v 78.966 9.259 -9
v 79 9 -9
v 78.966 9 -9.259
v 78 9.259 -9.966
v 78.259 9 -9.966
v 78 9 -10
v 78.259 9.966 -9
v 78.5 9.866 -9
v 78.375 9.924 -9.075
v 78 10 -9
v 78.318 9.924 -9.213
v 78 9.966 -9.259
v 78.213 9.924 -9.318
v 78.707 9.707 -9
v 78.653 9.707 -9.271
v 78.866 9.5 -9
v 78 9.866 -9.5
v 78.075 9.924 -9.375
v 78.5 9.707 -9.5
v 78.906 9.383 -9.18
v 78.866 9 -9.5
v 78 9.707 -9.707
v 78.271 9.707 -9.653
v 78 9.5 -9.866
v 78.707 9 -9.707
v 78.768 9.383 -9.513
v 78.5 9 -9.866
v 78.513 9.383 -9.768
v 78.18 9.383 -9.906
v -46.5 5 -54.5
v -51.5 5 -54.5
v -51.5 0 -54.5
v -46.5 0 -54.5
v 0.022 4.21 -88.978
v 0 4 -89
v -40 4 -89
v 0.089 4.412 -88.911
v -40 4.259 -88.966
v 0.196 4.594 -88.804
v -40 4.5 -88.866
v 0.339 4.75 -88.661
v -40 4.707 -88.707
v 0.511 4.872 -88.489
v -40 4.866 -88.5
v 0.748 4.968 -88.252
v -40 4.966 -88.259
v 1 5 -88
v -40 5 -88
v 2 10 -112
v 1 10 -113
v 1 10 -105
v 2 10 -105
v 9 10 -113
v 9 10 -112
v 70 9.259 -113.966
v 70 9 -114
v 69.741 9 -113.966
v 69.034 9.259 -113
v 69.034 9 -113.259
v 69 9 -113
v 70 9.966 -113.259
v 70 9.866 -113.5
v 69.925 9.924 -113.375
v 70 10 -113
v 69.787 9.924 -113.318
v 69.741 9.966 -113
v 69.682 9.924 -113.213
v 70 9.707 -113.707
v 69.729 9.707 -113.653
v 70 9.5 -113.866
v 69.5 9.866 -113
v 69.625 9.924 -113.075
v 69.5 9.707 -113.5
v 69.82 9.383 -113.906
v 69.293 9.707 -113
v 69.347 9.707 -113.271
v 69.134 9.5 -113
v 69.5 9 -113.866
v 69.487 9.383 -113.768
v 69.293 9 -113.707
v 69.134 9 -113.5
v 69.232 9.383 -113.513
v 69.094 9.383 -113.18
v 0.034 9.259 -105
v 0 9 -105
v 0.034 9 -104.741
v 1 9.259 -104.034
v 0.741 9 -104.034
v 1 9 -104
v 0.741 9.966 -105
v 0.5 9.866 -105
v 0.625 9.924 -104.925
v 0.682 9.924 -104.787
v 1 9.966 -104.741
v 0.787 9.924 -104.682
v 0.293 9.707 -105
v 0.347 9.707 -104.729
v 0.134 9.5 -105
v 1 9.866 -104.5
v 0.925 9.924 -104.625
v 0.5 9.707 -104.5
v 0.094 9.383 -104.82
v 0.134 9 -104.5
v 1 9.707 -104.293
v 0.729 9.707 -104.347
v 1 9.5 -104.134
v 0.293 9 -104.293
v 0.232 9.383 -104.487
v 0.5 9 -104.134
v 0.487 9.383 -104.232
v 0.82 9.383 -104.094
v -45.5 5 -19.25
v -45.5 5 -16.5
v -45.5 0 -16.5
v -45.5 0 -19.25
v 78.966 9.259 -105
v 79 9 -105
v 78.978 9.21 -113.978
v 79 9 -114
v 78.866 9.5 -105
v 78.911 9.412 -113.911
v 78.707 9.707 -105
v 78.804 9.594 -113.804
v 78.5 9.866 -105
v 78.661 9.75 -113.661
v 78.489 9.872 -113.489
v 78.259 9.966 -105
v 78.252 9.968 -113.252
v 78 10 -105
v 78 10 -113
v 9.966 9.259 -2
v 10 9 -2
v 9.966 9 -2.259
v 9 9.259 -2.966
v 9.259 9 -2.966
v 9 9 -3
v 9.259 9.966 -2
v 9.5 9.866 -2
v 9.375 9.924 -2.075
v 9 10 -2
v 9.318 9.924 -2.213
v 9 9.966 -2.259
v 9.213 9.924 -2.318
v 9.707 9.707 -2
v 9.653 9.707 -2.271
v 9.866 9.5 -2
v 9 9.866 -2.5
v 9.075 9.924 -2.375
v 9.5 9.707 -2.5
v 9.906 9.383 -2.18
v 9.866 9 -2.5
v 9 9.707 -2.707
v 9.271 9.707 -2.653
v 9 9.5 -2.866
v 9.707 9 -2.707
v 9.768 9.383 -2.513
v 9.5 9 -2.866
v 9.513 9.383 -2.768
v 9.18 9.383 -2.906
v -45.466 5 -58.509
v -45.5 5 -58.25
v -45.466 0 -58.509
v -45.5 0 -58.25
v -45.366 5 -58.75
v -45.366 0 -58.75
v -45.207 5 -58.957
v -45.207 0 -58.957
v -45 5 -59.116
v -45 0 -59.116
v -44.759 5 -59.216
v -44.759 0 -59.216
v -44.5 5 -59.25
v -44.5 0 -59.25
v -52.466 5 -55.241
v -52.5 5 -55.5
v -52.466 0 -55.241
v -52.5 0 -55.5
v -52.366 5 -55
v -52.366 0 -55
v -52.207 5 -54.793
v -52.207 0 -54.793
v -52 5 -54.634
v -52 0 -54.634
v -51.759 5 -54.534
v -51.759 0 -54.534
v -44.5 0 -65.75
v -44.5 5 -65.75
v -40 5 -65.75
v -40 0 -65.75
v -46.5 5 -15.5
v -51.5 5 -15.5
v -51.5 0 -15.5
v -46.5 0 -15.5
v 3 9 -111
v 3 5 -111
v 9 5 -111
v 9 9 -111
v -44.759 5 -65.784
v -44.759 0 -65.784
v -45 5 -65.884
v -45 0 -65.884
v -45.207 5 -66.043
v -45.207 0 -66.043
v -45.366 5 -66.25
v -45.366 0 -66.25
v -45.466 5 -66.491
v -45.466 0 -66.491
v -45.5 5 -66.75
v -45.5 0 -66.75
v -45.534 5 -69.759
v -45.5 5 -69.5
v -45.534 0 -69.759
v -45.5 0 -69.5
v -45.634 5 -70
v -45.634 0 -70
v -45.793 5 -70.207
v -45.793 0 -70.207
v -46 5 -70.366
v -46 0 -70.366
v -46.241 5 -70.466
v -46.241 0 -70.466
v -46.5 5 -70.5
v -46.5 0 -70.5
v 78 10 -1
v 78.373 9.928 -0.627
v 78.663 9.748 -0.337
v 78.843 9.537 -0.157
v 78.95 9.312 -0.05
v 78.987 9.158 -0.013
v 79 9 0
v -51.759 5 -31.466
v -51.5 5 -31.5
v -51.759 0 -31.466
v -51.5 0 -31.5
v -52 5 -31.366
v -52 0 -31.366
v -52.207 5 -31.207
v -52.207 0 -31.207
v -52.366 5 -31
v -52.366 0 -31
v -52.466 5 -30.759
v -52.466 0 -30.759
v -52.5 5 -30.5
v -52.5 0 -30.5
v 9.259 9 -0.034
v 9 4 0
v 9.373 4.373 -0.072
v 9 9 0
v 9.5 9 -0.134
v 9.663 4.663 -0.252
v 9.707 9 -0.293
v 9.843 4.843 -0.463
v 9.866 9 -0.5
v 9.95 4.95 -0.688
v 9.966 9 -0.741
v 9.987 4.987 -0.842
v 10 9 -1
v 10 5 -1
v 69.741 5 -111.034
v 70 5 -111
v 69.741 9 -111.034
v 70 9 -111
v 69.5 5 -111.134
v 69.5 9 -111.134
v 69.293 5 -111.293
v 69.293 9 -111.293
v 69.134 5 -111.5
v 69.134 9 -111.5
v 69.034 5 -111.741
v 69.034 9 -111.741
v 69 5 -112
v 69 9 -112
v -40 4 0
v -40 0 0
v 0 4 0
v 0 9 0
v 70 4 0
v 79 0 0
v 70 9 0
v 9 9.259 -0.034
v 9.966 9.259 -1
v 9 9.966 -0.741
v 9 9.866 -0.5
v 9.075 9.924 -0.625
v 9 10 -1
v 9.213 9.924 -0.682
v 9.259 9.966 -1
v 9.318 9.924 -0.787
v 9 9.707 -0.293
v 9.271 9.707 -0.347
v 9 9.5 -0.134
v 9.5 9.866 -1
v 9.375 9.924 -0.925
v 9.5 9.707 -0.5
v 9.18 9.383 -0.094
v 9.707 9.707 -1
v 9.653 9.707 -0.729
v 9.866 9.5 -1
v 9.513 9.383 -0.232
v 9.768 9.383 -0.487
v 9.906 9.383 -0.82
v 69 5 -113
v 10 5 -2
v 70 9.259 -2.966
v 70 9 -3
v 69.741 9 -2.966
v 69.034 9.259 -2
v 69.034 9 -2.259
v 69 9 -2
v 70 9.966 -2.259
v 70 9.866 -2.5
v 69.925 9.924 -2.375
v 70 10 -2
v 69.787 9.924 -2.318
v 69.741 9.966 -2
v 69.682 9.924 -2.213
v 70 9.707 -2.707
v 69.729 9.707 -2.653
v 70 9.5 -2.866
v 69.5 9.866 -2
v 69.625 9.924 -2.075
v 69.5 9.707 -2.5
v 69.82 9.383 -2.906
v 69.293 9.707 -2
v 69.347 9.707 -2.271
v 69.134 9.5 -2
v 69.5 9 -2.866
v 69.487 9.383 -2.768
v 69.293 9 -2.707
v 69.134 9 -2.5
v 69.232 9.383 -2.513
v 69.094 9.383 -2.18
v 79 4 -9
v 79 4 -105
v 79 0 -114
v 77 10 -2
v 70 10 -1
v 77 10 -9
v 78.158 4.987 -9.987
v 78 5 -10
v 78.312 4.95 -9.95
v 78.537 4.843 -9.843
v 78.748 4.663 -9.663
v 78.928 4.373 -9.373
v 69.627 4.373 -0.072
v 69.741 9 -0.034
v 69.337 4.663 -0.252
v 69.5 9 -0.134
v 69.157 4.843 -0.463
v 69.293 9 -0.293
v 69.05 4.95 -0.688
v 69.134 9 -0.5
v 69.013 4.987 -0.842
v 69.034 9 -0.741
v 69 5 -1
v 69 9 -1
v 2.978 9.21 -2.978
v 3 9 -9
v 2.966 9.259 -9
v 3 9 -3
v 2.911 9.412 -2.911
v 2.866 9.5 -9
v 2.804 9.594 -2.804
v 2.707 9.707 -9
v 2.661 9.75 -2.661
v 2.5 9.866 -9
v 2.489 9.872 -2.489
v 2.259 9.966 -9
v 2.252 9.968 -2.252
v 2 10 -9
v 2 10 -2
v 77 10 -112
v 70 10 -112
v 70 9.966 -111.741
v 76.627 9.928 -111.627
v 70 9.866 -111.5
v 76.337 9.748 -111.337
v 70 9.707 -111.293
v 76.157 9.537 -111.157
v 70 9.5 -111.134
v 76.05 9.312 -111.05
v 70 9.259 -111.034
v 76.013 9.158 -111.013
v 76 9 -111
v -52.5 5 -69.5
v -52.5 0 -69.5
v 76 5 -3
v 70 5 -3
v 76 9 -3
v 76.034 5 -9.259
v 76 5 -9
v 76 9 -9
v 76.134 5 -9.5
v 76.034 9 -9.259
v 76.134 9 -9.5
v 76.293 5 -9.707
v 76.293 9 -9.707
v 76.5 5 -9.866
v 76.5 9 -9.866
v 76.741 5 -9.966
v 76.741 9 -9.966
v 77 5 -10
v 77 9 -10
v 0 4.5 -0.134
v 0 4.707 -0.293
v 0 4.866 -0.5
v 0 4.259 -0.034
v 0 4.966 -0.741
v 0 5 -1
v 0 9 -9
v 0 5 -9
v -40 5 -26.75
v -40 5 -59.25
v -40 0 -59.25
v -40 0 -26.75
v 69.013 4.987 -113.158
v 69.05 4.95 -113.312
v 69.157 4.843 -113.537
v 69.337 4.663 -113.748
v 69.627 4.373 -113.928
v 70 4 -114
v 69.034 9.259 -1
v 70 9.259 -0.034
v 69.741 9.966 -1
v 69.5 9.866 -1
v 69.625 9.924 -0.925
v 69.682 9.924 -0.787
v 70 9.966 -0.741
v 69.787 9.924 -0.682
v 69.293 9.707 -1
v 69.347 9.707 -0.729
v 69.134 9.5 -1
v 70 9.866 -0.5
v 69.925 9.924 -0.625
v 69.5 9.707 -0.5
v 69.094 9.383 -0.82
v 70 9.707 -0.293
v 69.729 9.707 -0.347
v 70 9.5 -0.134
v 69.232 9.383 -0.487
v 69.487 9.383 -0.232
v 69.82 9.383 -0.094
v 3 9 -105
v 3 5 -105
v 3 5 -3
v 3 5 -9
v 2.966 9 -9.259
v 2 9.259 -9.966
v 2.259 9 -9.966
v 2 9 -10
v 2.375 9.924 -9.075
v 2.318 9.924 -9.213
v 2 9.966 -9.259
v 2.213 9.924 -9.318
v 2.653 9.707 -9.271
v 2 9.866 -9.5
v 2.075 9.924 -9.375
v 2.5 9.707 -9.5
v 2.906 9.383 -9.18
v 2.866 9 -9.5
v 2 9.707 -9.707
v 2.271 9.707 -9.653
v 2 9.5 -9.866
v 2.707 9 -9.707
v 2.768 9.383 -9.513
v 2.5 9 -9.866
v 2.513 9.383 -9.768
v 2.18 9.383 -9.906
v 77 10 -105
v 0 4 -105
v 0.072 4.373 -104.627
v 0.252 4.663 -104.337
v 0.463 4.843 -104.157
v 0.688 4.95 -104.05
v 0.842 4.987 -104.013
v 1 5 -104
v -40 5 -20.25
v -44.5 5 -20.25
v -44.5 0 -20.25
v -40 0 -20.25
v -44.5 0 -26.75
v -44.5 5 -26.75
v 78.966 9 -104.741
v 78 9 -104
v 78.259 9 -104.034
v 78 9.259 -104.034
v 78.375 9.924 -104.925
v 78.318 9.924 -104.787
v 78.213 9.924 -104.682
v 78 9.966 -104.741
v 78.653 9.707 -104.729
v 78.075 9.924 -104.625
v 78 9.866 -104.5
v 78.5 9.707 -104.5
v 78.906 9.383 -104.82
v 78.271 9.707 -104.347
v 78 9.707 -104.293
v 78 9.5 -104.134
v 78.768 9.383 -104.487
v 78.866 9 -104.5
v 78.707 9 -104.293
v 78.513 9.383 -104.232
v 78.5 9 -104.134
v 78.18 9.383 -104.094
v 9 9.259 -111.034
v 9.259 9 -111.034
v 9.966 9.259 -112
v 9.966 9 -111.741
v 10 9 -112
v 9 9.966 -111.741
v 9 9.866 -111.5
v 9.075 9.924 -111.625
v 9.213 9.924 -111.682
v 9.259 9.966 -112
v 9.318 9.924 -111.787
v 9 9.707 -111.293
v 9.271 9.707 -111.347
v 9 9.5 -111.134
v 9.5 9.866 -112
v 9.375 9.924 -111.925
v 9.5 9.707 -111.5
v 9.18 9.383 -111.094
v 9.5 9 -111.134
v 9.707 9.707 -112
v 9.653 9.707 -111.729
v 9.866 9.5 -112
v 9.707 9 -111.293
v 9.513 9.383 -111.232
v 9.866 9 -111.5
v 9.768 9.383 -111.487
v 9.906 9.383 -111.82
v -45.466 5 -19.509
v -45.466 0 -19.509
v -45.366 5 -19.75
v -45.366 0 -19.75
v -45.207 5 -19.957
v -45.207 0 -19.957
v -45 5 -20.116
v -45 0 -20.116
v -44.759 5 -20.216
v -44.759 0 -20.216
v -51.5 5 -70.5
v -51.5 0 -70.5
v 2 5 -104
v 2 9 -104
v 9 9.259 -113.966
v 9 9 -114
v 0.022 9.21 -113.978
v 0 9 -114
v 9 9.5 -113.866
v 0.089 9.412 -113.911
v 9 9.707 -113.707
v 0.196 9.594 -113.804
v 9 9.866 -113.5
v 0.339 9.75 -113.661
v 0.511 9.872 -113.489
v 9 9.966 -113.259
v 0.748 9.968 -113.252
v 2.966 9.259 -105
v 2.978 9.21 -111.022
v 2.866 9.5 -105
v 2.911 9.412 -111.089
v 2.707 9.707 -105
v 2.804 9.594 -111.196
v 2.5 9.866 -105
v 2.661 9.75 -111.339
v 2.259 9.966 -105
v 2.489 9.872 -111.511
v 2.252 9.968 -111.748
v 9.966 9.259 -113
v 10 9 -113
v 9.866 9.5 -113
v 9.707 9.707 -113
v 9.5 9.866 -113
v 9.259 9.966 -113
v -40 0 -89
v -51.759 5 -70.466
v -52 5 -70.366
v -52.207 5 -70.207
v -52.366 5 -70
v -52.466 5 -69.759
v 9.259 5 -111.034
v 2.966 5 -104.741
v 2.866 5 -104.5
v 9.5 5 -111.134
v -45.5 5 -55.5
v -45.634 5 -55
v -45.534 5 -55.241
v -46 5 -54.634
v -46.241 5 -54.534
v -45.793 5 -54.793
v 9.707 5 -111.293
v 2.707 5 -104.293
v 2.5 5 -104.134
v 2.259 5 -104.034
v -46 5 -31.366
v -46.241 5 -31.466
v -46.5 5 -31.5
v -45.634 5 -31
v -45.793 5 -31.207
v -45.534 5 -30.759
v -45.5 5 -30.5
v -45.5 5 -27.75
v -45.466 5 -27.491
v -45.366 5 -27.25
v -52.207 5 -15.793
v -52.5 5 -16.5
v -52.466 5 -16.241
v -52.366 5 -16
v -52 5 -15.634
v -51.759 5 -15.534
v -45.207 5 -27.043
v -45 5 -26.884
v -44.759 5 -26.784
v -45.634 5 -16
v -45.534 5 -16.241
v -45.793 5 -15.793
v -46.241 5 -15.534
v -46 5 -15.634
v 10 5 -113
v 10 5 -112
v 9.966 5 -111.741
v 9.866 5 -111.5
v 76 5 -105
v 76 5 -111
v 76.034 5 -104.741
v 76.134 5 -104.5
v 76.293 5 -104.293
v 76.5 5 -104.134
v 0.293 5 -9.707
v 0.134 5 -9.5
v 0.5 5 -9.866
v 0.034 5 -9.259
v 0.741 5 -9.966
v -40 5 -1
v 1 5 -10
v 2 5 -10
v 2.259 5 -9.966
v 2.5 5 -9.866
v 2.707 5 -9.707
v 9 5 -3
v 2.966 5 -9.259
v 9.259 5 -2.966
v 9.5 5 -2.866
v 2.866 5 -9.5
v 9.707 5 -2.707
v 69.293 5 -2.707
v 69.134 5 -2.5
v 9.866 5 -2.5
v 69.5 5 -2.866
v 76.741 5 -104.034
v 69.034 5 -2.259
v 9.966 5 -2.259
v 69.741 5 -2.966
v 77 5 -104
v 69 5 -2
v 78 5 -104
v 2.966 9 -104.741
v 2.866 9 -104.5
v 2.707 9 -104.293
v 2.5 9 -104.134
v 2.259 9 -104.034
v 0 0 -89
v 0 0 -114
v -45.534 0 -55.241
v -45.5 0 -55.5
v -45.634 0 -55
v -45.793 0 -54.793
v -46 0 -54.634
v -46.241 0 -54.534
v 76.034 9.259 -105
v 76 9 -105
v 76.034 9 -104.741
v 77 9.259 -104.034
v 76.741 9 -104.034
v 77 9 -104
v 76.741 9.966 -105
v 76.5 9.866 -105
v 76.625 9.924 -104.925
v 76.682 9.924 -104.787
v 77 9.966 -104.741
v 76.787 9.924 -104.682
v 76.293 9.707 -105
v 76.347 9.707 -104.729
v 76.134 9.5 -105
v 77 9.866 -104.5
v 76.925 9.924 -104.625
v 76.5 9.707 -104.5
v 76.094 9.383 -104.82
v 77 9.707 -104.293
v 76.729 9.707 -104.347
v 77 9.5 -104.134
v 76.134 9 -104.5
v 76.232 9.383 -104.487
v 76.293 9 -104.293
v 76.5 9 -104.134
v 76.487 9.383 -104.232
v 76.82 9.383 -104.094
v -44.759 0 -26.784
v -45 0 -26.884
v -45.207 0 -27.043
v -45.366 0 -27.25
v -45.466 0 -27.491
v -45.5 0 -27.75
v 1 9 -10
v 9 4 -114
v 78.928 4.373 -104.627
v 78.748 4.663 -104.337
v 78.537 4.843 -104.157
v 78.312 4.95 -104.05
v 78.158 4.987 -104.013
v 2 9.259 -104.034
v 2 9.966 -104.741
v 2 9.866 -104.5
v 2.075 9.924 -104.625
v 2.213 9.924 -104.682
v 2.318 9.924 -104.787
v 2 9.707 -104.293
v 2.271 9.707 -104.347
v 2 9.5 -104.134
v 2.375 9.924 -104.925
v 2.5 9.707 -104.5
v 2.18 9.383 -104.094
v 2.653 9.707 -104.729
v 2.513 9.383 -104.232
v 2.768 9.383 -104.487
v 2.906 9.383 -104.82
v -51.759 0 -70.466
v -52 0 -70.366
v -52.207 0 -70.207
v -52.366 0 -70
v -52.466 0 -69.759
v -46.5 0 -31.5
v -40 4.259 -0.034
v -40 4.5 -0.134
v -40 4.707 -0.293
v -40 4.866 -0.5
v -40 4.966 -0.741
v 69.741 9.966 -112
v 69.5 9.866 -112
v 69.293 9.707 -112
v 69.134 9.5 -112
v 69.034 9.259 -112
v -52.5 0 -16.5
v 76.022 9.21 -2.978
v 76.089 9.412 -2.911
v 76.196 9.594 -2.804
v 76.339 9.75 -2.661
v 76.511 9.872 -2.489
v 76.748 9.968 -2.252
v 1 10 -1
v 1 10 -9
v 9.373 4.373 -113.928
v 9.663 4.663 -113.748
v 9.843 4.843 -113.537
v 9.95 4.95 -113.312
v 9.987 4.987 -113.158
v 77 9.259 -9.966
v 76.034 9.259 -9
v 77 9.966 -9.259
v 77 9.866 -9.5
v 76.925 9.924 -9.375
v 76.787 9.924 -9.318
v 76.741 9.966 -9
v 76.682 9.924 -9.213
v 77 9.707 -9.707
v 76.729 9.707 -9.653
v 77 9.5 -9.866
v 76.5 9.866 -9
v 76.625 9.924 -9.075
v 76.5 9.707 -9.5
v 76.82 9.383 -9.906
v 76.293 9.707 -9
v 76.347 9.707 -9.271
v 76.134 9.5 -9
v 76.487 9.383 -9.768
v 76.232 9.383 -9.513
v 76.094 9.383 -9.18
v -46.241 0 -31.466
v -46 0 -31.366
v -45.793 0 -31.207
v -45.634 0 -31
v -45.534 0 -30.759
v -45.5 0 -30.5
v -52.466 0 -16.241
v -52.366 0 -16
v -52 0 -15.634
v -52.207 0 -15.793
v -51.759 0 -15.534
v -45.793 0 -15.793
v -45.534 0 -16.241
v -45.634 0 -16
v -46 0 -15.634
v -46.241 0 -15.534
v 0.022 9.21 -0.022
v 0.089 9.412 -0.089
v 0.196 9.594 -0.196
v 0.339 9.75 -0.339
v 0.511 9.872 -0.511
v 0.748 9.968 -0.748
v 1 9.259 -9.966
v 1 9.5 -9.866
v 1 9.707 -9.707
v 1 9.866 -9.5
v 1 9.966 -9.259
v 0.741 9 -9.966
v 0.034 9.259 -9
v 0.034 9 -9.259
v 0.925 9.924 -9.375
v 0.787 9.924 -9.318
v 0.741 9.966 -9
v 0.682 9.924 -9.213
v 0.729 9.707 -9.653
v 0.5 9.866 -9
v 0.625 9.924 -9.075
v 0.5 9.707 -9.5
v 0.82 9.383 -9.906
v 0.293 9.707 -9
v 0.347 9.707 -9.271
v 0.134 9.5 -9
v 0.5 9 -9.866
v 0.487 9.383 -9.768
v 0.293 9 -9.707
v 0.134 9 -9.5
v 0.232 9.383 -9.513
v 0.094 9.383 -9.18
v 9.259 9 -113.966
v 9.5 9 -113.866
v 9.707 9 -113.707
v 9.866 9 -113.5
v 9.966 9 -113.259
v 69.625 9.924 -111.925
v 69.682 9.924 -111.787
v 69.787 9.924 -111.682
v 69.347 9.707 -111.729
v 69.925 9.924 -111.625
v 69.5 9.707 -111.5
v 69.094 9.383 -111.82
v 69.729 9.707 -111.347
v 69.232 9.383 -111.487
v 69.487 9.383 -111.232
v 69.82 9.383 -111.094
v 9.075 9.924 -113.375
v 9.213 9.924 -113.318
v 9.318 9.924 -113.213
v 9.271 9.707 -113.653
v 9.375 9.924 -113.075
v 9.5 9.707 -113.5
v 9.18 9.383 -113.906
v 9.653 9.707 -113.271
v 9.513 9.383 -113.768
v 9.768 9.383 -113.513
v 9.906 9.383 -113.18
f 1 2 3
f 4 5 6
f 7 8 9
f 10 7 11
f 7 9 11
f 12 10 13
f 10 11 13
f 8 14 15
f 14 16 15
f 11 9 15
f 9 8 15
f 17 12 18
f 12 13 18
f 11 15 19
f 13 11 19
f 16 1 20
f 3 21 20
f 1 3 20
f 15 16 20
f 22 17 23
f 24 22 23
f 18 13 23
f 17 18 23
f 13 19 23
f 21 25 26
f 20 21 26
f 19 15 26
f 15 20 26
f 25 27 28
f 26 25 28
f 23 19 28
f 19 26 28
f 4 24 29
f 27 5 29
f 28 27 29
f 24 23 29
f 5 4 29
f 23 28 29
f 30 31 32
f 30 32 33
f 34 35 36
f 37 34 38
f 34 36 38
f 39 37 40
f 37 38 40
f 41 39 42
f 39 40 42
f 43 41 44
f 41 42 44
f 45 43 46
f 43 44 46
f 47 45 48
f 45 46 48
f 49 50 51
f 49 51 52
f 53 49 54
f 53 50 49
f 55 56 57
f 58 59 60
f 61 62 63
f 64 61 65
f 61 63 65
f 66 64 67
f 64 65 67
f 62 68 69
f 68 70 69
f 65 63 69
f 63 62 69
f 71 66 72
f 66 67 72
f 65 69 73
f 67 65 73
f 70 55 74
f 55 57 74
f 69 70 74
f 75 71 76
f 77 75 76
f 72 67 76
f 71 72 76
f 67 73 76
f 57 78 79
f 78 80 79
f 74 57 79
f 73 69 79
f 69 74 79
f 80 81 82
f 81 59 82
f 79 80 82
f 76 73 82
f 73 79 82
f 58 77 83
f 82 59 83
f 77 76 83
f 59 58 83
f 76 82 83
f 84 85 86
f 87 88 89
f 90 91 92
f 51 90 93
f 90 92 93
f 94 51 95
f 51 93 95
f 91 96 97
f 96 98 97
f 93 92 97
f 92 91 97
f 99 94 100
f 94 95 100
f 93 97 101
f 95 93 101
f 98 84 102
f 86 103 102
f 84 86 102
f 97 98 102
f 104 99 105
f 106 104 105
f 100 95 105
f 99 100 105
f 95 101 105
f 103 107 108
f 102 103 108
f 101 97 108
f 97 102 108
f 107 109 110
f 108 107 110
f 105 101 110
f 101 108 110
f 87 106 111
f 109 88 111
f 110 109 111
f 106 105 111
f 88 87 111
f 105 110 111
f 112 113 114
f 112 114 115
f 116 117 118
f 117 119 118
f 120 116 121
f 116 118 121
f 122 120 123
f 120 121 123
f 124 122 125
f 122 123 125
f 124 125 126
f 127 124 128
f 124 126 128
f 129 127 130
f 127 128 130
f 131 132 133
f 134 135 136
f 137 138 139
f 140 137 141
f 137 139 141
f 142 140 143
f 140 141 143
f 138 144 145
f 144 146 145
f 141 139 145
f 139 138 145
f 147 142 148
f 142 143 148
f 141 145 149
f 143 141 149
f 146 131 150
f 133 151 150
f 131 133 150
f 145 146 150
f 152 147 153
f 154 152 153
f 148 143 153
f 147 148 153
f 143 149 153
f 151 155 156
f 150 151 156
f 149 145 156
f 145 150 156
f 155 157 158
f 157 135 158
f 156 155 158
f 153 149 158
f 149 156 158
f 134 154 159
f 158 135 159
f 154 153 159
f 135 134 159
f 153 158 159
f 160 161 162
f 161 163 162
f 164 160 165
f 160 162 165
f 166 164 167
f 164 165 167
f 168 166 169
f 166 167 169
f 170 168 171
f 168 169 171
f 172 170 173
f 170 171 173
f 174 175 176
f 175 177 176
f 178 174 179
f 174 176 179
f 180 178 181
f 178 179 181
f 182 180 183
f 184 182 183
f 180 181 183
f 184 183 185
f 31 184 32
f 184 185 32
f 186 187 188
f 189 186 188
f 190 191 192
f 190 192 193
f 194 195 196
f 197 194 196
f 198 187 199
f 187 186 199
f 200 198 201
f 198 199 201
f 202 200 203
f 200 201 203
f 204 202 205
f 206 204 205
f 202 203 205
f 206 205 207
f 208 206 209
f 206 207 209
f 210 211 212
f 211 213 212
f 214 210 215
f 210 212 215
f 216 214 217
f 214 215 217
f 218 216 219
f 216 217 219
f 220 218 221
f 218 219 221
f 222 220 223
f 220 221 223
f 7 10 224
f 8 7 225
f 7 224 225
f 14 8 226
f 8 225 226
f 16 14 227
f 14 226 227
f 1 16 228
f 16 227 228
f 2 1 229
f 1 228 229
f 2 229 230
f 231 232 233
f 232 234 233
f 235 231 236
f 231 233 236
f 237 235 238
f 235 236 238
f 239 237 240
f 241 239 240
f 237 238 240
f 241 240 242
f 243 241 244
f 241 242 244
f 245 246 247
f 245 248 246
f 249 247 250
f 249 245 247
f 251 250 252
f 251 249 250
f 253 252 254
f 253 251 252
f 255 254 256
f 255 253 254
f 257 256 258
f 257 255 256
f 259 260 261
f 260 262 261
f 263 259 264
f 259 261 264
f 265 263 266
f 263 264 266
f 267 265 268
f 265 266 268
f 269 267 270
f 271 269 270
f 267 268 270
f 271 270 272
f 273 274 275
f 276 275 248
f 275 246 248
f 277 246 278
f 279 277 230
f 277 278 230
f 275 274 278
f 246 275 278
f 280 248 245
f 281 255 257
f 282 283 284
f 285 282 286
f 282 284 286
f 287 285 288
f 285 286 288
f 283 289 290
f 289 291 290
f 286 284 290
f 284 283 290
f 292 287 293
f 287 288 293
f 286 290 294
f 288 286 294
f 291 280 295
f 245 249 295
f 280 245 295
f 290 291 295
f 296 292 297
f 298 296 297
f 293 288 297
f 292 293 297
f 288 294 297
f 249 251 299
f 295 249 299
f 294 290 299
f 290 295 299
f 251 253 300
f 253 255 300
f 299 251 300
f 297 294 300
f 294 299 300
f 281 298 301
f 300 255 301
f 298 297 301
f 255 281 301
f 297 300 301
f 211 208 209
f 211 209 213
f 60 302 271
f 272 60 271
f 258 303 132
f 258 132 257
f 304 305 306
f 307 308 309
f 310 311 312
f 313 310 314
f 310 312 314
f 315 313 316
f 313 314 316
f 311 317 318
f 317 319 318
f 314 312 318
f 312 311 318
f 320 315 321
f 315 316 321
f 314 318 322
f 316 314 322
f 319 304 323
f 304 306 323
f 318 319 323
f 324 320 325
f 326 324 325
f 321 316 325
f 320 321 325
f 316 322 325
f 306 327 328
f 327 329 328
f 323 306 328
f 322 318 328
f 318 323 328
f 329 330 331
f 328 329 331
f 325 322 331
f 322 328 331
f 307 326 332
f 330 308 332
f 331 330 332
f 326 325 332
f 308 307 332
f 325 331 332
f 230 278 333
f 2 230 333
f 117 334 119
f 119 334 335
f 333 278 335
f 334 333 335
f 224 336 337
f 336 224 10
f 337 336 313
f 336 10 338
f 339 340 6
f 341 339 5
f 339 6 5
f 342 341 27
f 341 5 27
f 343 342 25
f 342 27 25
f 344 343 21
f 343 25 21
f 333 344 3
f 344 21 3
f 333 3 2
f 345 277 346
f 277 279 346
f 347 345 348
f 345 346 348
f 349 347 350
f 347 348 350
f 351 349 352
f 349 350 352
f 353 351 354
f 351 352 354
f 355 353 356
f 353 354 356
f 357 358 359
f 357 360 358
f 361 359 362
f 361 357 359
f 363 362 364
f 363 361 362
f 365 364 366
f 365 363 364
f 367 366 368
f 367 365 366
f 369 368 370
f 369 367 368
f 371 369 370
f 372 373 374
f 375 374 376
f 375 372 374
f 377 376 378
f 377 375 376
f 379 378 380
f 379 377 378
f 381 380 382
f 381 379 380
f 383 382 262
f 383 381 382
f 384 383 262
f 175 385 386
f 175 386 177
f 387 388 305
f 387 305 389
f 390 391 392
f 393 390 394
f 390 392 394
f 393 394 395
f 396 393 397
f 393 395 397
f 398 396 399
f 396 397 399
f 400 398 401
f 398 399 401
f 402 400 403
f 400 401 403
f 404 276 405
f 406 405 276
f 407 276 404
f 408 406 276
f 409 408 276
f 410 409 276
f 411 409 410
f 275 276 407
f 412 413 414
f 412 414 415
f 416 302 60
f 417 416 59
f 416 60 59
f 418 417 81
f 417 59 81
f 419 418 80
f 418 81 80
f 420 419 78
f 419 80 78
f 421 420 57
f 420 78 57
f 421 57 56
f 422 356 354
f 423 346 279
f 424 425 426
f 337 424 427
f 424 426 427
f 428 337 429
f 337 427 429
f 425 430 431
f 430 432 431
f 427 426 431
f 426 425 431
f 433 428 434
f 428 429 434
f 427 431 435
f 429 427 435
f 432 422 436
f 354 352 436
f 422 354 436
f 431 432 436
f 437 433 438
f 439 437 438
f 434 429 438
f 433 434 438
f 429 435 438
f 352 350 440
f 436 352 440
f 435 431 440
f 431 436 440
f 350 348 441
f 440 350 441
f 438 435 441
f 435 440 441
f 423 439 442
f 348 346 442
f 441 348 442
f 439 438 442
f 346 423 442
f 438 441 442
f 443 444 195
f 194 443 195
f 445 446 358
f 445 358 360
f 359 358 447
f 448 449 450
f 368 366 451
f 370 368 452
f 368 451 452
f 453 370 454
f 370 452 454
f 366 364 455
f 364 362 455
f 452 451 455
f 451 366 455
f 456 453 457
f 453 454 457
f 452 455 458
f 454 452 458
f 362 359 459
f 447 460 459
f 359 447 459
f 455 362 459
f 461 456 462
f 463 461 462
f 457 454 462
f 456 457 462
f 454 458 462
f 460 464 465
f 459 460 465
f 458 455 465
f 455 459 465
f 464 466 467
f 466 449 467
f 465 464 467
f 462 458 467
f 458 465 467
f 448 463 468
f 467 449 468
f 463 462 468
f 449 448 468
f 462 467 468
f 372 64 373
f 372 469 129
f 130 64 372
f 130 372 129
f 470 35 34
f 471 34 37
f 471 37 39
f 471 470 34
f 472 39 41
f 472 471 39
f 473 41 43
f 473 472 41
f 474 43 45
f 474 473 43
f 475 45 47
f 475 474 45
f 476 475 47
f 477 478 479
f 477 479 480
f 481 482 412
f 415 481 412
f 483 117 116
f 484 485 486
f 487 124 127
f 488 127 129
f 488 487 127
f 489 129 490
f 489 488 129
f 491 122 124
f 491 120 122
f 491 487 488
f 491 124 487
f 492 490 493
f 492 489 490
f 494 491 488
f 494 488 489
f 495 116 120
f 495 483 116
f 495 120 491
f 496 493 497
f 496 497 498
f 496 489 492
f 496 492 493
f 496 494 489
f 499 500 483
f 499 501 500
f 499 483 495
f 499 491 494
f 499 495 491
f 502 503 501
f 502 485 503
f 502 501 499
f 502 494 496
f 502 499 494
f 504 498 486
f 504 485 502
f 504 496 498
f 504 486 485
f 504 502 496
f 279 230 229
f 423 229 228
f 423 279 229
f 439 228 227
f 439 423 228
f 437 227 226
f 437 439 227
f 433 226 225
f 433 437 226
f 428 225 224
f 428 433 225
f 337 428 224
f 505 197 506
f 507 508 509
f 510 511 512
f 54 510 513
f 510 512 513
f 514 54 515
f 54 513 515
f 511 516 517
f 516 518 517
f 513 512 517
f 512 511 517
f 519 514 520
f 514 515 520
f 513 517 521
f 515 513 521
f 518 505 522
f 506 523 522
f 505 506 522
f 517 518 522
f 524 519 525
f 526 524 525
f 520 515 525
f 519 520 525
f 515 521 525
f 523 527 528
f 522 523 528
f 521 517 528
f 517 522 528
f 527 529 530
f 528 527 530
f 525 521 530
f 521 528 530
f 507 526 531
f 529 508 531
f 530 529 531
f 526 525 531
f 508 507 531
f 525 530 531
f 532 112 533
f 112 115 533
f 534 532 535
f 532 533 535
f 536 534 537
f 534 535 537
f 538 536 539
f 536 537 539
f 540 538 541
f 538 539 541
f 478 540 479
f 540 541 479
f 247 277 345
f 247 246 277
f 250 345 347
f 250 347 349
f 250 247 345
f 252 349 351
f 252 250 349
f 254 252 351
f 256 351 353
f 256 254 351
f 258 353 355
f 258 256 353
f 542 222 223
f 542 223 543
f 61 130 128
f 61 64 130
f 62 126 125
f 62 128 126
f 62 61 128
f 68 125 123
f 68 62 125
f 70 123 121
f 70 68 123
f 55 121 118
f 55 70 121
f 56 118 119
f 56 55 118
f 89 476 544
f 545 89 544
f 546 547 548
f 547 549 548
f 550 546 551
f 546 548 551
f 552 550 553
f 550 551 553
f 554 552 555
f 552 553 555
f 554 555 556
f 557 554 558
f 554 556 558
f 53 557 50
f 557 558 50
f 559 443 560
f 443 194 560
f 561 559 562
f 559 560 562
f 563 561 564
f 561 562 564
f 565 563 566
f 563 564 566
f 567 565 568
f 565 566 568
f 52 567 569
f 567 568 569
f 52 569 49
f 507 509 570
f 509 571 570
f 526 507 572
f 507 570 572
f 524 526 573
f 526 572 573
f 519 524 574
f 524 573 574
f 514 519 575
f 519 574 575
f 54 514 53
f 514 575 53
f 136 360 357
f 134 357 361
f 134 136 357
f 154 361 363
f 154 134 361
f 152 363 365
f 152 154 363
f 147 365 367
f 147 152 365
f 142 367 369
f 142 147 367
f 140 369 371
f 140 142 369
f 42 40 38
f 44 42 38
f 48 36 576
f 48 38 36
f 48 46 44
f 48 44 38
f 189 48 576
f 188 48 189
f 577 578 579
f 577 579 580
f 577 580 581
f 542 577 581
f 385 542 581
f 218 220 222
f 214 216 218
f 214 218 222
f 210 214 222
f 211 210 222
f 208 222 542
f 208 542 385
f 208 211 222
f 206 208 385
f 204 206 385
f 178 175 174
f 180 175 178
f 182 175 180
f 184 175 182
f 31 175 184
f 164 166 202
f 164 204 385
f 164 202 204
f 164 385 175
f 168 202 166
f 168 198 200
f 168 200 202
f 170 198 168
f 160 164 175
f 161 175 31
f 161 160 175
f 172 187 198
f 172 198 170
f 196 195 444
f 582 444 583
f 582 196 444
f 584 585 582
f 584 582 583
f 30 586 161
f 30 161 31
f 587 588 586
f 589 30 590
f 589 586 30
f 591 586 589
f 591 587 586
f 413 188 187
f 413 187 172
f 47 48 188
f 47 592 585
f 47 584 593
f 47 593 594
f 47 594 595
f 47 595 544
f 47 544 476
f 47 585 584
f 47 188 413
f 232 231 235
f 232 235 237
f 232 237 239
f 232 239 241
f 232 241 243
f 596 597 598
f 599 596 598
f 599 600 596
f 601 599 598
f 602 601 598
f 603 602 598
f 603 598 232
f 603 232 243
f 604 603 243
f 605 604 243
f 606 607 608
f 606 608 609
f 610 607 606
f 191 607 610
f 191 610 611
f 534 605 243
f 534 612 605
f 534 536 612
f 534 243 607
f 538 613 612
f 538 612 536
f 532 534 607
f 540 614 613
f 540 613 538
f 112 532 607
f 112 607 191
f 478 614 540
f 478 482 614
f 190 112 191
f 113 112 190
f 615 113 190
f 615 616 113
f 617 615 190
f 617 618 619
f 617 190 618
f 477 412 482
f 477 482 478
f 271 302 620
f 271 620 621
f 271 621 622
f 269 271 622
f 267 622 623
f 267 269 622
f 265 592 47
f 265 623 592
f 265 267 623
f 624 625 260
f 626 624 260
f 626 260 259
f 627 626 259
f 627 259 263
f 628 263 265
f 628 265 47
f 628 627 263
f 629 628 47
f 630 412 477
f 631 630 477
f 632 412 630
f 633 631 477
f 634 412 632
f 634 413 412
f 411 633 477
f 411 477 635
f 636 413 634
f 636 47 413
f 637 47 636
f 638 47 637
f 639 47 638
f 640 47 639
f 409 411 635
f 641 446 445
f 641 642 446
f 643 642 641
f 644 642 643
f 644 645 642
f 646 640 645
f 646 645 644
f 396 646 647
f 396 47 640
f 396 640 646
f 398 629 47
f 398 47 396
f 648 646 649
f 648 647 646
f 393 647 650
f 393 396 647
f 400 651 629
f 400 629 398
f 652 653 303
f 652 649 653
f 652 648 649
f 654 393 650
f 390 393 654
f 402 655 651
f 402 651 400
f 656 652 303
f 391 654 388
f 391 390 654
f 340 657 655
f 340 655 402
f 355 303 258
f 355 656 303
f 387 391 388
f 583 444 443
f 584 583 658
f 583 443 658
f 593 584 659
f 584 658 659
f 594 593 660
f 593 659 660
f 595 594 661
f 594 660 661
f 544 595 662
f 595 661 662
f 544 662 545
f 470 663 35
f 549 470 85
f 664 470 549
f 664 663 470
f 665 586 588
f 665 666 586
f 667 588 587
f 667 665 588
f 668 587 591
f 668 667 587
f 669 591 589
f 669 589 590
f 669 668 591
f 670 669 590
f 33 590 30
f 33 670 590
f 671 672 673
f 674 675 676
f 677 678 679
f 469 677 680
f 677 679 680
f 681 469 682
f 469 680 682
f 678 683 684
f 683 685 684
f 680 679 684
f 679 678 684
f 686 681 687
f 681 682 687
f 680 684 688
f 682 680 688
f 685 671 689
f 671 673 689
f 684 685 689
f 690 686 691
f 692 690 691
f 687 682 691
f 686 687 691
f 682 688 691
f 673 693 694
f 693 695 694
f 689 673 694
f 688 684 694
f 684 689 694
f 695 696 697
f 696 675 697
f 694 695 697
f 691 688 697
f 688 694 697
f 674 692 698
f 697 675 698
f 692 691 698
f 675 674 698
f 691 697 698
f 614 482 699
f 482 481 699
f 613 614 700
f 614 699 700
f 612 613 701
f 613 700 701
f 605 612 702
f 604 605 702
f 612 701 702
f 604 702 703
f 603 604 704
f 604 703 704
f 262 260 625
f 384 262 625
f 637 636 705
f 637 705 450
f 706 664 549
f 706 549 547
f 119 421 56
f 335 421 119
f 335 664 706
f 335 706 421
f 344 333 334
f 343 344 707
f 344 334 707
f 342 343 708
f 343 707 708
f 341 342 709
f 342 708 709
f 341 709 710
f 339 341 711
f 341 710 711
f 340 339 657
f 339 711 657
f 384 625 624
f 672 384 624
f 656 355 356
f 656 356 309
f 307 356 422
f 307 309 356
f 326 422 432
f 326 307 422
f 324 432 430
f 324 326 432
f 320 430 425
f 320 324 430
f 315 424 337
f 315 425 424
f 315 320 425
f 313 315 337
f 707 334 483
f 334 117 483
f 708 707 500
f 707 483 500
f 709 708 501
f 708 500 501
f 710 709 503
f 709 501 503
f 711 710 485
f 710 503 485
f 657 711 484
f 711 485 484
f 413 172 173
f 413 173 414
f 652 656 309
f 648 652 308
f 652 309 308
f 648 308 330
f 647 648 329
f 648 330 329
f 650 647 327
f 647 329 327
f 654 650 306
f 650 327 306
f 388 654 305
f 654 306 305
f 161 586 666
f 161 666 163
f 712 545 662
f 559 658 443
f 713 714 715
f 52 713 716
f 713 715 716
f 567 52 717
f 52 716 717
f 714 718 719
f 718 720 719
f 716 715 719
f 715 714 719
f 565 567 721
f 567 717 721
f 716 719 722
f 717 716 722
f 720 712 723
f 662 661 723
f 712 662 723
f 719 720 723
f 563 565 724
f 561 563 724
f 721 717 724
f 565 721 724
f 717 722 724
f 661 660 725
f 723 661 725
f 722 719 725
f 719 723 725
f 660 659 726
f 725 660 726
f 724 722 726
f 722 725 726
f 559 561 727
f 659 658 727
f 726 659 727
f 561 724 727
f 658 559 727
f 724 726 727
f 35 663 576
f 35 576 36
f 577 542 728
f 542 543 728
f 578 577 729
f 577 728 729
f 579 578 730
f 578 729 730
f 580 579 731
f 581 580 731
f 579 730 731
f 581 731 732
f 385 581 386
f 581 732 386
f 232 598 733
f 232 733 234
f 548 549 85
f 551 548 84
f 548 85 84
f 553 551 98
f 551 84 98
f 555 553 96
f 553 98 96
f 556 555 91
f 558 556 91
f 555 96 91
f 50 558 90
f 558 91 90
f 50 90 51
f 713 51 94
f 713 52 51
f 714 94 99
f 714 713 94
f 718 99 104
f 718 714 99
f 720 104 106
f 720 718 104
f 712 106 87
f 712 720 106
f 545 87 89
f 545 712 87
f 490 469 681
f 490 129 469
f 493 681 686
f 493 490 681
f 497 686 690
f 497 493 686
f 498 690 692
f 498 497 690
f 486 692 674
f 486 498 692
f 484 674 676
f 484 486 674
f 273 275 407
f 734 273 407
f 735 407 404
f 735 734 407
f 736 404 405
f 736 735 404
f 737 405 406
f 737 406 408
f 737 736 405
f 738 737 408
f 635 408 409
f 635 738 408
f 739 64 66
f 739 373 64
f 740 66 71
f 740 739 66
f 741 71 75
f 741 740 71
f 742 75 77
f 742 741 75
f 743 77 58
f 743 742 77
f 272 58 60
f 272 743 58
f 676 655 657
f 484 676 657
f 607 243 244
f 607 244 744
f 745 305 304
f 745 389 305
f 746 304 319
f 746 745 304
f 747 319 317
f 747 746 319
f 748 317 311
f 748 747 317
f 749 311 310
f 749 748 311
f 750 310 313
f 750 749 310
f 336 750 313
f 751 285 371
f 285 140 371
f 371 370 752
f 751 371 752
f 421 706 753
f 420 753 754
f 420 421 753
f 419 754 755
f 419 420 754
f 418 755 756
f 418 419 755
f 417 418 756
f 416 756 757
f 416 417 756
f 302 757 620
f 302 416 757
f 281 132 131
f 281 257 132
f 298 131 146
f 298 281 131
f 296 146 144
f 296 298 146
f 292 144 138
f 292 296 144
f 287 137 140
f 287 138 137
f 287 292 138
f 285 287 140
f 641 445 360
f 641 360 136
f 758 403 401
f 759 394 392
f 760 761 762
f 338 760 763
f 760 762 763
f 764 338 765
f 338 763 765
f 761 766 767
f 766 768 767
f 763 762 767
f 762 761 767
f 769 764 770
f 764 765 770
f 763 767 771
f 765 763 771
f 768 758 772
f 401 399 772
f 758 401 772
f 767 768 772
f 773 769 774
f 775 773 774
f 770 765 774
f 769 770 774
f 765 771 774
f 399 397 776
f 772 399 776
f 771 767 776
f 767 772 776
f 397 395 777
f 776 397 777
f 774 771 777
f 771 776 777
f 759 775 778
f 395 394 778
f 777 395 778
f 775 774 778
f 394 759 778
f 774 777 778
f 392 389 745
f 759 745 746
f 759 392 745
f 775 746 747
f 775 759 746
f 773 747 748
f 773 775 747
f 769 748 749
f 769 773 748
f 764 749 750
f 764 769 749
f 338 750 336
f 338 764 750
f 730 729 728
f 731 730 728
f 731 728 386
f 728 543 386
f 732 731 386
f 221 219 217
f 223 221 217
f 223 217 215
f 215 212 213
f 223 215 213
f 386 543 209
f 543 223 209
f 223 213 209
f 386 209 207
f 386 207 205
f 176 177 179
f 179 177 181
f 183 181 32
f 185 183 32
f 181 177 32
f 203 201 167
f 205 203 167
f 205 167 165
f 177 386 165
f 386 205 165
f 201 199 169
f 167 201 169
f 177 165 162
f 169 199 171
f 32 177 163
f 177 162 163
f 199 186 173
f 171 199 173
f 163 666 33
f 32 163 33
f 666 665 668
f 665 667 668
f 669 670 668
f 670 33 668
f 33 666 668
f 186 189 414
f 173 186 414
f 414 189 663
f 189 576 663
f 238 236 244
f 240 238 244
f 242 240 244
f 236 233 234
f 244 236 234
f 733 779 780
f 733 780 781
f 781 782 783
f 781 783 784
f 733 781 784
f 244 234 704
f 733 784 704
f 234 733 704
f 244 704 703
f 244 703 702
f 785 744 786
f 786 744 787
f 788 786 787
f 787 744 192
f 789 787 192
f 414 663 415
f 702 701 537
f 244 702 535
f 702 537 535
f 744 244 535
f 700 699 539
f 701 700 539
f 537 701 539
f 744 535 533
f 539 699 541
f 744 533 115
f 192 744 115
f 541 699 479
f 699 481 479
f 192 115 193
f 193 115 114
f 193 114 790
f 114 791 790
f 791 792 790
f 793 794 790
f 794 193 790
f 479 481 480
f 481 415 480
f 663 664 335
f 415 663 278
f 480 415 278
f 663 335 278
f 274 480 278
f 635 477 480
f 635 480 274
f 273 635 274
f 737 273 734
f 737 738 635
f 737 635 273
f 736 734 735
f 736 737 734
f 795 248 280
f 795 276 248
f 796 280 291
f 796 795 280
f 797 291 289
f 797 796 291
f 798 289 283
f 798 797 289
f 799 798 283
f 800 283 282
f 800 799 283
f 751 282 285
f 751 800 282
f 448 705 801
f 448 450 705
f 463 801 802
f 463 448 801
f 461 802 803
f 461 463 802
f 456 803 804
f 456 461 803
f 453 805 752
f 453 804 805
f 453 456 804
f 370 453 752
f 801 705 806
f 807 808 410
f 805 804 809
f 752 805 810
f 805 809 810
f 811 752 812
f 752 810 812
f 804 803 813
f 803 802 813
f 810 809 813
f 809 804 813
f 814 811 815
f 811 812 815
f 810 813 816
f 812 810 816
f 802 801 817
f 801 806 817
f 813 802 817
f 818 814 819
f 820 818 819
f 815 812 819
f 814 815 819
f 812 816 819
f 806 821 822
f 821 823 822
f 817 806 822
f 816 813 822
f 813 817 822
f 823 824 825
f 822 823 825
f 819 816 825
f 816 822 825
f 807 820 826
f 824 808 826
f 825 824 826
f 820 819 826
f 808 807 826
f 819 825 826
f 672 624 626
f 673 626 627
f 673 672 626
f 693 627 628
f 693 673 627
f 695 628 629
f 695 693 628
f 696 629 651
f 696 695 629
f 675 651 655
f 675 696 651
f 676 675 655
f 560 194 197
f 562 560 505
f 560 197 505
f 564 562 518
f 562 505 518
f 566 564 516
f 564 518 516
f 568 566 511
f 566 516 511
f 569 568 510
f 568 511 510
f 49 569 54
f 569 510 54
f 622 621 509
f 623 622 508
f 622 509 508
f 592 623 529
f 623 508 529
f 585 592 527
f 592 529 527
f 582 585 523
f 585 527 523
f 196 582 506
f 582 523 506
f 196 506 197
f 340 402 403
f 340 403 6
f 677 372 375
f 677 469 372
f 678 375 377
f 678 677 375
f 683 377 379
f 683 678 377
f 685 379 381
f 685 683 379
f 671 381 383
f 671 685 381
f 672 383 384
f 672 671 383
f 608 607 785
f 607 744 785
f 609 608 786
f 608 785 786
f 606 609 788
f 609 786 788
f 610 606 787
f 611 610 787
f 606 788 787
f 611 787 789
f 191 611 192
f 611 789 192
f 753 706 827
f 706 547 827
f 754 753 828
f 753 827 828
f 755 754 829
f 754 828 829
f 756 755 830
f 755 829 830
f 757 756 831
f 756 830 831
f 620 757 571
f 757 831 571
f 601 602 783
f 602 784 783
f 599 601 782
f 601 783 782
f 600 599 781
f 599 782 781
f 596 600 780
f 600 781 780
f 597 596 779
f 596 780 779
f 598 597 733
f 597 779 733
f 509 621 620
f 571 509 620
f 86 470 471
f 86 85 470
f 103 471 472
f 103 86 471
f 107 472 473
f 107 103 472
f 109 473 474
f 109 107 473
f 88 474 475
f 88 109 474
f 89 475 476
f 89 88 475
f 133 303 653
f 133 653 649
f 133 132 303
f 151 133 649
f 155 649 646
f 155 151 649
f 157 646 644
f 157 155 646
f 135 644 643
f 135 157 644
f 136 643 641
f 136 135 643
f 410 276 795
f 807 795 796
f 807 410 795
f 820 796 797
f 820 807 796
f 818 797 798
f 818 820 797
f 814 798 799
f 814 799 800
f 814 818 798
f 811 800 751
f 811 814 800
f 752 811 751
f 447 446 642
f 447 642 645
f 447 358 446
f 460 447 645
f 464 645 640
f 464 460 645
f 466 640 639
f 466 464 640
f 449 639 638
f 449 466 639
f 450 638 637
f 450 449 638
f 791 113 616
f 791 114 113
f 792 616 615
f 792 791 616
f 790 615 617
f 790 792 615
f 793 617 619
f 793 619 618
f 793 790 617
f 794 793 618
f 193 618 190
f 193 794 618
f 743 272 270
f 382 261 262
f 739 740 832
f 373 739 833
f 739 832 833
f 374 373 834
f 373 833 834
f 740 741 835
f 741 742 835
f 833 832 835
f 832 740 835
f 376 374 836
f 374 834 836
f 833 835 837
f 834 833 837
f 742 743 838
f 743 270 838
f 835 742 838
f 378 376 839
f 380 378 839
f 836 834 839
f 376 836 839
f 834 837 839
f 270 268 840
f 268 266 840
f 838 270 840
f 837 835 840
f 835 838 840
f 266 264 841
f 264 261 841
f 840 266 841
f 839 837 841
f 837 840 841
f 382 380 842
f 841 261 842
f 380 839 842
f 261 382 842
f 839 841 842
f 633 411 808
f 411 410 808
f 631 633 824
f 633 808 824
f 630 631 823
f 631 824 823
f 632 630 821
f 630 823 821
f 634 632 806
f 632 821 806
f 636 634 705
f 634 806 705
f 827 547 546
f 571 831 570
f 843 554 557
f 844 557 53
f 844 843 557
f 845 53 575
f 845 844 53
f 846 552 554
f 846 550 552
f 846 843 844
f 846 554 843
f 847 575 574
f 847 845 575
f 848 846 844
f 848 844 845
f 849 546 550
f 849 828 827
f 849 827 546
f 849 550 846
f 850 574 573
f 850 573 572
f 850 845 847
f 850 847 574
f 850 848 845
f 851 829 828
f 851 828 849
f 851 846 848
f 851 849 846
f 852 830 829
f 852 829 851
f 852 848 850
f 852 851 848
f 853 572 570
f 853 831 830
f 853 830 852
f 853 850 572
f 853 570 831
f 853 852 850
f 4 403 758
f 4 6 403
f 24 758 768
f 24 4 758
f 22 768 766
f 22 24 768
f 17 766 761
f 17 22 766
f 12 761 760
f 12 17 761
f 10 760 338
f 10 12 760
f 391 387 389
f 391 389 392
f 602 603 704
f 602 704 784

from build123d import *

# Parameters (mm, degrees)
SKETCH1_W           = 79
SKETCH1_H           = 114
BOSS_EXTRUDE1_DEPTH = 5
BOSS_EXTRUDE2_DEPTH = 5
FILLET1_R           = 1
SKETCH3_W           = 89
SKETCH3_H           = 5
BOSS_EXTRUDE3_DEPTH = 40
BOSS_EXTRUDE4_DEPTH = 5
FILLET2_R           = 1
FILLET3_R           = 1


with BuildPart() as part:
    # Sketch1 → Boss-Extrude1 (new body)
    with BuildSketch(Plane(origin=(0, 0, 0), x_dir=(1, 0, 0), z_dir=(0, 1, 0))):
        with Locations((39.5, 57)):
            Rectangle(SKETCH1_W, SKETCH1_H)
    extrude(amount=BOSS_EXTRUDE1_DEPTH)

    # Sketch2 → Boss-Extrude2 (add)
    with BuildSketch(Plane(origin=(0, 5, 0), x_dir=(1, 0, 0), z_dir=(0, 1, 0))):
        Polygon((0, 0), (0, 10), (3, 10), (3, 3), (10, 3), (10, 0), align=None)
        Polygon((79, 0), (69, 0), (69, 3), (76, 3), (76, 10), (79, 10), align=None)
        Polygon((79, 114), (69, 114), (69, 111), (76, 111), (76, 104), (79, 104), align=None)
        Polygon((0, 114), (0, 104), (3, 104), (3, 111), (10, 111), (10, 114), align=None)
    extrude(amount=BOSS_EXTRUDE2_DEPTH)

    # Fillet1
    fillet1_edges = [part.edges().sort_by_distance(p)[0] for p in [
        (74, 10, 0),
        (79, 10, -5),
        (77.5, 10, -10),
        (76, 10, -6.5),
        (72.5, 10, -3),
        (69, 10, -1.5),
        (69, 7.5, 0),
        (69, 7.5, -3),
        (76, 7.5, -10),
        (79, 7.5, -10),
        (79, 10, -109),
        (74, 10, -114),
        (69, 10, -112.5),
        (72.5, 10, -111),
        (76, 10, -107.5),
        (77.5, 10, -104),
        (79, 7.5, -104),
        (76, 7.5, -104),
        (69, 7.5, -111),
        (69, 7.5, -114),
        (10, 7.5, -111),
        (3, 7.5, -104),
        (10, 7.5, -114),
        (0, 7.5, -104),
        (1.5, 10, -104),
        (10, 10, -112.5),
        (6.5, 10, -111),
        (5, 10, -114),
        (3, 10, -107.5),
        (0, 10, -109),
        (3, 7.5, -10),
        (0, 7.5, -10),
        (10, 7.5, -3),
        (10, 7.5, 0),
        (10, 10, -1.5),
        (1.5, 10, -10),
        (6.5, 10, -3),
        (3, 10, -6.5),
        (0, 10, -5),
        (5, 10, 0),
    ]]
    fillet(fillet1_edges, radius=FILLET1_R)

    # Sketch3 → Boss-Extrude3 (add)
    with BuildSketch(Plane.ZY):
        with Locations((-44.5, 2.5)):
            Rectangle(SKETCH3_W, SKETCH3_H)
    extrude(amount=BOSS_EXTRUDE3_DEPTH)

    # Sketch4 → Boss-Extrude4 (add)
    with BuildSketch(Plane(origin=(0, 5, 0), x_dir=(1, 0, 0), z_dir=(0, 1, 0))):
        Polygon((-45.5, 59.25), (-40, 59.25), (-40, 65.75), (-45.5, 65.75), (-45.5, 70.5), (-52.5, 70.5), (-52.5, 54.5), (-45.5, 54.5), align=None)
        Polygon((-45.5, 20.25), (-40, 20.25), (-40, 26.75), (-45.5, 26.75), (-45.5, 31.5), (-52.5, 31.5), (-52.5, 15.5), (-45.5, 15.5), align=None)
    extrude(amount=-BOSS_EXTRUDE4_DEPTH)

    # Fillet2
    fillet2_edges = [part.edges().sort_by_distance(p)[0] for p in [
        (-52.5, 2.5, -70.5),
        (-45.5, 2.5, -70.5),
        (-45.5, 2.5, -65.75),
        (-45.5, 2.5, -59.25),
        (-45.5, 2.5, -54.5),
        (-52.5, 2.5, -54.5),
        (-45.5, 2.5, -26.75),
        (-45.5, 2.5, -31.5),
        (-52.5, 2.5, -31.5),
        (-52.5, 2.5, -15.5),
        (-45.5, 2.5, -15.5),
        (-45.5, 2.5, -20.25),
    ]]
    fillet(fillet2_edges, radius=FILLET2_R)

    # Fillet3
    fillet3_edges = [part.edges().sort_by_distance(p)[0] for p in [
        (-20, 5, -89),
        (0, 5, -97),
        (39.5, 5, -114),
        (79, 5, -57),
        (39.5, 5, 0),
        (-20, 5, 0),
    ]]
    fillet(fillet3_edges, radius=FILLET3_R)


solid = part.part
